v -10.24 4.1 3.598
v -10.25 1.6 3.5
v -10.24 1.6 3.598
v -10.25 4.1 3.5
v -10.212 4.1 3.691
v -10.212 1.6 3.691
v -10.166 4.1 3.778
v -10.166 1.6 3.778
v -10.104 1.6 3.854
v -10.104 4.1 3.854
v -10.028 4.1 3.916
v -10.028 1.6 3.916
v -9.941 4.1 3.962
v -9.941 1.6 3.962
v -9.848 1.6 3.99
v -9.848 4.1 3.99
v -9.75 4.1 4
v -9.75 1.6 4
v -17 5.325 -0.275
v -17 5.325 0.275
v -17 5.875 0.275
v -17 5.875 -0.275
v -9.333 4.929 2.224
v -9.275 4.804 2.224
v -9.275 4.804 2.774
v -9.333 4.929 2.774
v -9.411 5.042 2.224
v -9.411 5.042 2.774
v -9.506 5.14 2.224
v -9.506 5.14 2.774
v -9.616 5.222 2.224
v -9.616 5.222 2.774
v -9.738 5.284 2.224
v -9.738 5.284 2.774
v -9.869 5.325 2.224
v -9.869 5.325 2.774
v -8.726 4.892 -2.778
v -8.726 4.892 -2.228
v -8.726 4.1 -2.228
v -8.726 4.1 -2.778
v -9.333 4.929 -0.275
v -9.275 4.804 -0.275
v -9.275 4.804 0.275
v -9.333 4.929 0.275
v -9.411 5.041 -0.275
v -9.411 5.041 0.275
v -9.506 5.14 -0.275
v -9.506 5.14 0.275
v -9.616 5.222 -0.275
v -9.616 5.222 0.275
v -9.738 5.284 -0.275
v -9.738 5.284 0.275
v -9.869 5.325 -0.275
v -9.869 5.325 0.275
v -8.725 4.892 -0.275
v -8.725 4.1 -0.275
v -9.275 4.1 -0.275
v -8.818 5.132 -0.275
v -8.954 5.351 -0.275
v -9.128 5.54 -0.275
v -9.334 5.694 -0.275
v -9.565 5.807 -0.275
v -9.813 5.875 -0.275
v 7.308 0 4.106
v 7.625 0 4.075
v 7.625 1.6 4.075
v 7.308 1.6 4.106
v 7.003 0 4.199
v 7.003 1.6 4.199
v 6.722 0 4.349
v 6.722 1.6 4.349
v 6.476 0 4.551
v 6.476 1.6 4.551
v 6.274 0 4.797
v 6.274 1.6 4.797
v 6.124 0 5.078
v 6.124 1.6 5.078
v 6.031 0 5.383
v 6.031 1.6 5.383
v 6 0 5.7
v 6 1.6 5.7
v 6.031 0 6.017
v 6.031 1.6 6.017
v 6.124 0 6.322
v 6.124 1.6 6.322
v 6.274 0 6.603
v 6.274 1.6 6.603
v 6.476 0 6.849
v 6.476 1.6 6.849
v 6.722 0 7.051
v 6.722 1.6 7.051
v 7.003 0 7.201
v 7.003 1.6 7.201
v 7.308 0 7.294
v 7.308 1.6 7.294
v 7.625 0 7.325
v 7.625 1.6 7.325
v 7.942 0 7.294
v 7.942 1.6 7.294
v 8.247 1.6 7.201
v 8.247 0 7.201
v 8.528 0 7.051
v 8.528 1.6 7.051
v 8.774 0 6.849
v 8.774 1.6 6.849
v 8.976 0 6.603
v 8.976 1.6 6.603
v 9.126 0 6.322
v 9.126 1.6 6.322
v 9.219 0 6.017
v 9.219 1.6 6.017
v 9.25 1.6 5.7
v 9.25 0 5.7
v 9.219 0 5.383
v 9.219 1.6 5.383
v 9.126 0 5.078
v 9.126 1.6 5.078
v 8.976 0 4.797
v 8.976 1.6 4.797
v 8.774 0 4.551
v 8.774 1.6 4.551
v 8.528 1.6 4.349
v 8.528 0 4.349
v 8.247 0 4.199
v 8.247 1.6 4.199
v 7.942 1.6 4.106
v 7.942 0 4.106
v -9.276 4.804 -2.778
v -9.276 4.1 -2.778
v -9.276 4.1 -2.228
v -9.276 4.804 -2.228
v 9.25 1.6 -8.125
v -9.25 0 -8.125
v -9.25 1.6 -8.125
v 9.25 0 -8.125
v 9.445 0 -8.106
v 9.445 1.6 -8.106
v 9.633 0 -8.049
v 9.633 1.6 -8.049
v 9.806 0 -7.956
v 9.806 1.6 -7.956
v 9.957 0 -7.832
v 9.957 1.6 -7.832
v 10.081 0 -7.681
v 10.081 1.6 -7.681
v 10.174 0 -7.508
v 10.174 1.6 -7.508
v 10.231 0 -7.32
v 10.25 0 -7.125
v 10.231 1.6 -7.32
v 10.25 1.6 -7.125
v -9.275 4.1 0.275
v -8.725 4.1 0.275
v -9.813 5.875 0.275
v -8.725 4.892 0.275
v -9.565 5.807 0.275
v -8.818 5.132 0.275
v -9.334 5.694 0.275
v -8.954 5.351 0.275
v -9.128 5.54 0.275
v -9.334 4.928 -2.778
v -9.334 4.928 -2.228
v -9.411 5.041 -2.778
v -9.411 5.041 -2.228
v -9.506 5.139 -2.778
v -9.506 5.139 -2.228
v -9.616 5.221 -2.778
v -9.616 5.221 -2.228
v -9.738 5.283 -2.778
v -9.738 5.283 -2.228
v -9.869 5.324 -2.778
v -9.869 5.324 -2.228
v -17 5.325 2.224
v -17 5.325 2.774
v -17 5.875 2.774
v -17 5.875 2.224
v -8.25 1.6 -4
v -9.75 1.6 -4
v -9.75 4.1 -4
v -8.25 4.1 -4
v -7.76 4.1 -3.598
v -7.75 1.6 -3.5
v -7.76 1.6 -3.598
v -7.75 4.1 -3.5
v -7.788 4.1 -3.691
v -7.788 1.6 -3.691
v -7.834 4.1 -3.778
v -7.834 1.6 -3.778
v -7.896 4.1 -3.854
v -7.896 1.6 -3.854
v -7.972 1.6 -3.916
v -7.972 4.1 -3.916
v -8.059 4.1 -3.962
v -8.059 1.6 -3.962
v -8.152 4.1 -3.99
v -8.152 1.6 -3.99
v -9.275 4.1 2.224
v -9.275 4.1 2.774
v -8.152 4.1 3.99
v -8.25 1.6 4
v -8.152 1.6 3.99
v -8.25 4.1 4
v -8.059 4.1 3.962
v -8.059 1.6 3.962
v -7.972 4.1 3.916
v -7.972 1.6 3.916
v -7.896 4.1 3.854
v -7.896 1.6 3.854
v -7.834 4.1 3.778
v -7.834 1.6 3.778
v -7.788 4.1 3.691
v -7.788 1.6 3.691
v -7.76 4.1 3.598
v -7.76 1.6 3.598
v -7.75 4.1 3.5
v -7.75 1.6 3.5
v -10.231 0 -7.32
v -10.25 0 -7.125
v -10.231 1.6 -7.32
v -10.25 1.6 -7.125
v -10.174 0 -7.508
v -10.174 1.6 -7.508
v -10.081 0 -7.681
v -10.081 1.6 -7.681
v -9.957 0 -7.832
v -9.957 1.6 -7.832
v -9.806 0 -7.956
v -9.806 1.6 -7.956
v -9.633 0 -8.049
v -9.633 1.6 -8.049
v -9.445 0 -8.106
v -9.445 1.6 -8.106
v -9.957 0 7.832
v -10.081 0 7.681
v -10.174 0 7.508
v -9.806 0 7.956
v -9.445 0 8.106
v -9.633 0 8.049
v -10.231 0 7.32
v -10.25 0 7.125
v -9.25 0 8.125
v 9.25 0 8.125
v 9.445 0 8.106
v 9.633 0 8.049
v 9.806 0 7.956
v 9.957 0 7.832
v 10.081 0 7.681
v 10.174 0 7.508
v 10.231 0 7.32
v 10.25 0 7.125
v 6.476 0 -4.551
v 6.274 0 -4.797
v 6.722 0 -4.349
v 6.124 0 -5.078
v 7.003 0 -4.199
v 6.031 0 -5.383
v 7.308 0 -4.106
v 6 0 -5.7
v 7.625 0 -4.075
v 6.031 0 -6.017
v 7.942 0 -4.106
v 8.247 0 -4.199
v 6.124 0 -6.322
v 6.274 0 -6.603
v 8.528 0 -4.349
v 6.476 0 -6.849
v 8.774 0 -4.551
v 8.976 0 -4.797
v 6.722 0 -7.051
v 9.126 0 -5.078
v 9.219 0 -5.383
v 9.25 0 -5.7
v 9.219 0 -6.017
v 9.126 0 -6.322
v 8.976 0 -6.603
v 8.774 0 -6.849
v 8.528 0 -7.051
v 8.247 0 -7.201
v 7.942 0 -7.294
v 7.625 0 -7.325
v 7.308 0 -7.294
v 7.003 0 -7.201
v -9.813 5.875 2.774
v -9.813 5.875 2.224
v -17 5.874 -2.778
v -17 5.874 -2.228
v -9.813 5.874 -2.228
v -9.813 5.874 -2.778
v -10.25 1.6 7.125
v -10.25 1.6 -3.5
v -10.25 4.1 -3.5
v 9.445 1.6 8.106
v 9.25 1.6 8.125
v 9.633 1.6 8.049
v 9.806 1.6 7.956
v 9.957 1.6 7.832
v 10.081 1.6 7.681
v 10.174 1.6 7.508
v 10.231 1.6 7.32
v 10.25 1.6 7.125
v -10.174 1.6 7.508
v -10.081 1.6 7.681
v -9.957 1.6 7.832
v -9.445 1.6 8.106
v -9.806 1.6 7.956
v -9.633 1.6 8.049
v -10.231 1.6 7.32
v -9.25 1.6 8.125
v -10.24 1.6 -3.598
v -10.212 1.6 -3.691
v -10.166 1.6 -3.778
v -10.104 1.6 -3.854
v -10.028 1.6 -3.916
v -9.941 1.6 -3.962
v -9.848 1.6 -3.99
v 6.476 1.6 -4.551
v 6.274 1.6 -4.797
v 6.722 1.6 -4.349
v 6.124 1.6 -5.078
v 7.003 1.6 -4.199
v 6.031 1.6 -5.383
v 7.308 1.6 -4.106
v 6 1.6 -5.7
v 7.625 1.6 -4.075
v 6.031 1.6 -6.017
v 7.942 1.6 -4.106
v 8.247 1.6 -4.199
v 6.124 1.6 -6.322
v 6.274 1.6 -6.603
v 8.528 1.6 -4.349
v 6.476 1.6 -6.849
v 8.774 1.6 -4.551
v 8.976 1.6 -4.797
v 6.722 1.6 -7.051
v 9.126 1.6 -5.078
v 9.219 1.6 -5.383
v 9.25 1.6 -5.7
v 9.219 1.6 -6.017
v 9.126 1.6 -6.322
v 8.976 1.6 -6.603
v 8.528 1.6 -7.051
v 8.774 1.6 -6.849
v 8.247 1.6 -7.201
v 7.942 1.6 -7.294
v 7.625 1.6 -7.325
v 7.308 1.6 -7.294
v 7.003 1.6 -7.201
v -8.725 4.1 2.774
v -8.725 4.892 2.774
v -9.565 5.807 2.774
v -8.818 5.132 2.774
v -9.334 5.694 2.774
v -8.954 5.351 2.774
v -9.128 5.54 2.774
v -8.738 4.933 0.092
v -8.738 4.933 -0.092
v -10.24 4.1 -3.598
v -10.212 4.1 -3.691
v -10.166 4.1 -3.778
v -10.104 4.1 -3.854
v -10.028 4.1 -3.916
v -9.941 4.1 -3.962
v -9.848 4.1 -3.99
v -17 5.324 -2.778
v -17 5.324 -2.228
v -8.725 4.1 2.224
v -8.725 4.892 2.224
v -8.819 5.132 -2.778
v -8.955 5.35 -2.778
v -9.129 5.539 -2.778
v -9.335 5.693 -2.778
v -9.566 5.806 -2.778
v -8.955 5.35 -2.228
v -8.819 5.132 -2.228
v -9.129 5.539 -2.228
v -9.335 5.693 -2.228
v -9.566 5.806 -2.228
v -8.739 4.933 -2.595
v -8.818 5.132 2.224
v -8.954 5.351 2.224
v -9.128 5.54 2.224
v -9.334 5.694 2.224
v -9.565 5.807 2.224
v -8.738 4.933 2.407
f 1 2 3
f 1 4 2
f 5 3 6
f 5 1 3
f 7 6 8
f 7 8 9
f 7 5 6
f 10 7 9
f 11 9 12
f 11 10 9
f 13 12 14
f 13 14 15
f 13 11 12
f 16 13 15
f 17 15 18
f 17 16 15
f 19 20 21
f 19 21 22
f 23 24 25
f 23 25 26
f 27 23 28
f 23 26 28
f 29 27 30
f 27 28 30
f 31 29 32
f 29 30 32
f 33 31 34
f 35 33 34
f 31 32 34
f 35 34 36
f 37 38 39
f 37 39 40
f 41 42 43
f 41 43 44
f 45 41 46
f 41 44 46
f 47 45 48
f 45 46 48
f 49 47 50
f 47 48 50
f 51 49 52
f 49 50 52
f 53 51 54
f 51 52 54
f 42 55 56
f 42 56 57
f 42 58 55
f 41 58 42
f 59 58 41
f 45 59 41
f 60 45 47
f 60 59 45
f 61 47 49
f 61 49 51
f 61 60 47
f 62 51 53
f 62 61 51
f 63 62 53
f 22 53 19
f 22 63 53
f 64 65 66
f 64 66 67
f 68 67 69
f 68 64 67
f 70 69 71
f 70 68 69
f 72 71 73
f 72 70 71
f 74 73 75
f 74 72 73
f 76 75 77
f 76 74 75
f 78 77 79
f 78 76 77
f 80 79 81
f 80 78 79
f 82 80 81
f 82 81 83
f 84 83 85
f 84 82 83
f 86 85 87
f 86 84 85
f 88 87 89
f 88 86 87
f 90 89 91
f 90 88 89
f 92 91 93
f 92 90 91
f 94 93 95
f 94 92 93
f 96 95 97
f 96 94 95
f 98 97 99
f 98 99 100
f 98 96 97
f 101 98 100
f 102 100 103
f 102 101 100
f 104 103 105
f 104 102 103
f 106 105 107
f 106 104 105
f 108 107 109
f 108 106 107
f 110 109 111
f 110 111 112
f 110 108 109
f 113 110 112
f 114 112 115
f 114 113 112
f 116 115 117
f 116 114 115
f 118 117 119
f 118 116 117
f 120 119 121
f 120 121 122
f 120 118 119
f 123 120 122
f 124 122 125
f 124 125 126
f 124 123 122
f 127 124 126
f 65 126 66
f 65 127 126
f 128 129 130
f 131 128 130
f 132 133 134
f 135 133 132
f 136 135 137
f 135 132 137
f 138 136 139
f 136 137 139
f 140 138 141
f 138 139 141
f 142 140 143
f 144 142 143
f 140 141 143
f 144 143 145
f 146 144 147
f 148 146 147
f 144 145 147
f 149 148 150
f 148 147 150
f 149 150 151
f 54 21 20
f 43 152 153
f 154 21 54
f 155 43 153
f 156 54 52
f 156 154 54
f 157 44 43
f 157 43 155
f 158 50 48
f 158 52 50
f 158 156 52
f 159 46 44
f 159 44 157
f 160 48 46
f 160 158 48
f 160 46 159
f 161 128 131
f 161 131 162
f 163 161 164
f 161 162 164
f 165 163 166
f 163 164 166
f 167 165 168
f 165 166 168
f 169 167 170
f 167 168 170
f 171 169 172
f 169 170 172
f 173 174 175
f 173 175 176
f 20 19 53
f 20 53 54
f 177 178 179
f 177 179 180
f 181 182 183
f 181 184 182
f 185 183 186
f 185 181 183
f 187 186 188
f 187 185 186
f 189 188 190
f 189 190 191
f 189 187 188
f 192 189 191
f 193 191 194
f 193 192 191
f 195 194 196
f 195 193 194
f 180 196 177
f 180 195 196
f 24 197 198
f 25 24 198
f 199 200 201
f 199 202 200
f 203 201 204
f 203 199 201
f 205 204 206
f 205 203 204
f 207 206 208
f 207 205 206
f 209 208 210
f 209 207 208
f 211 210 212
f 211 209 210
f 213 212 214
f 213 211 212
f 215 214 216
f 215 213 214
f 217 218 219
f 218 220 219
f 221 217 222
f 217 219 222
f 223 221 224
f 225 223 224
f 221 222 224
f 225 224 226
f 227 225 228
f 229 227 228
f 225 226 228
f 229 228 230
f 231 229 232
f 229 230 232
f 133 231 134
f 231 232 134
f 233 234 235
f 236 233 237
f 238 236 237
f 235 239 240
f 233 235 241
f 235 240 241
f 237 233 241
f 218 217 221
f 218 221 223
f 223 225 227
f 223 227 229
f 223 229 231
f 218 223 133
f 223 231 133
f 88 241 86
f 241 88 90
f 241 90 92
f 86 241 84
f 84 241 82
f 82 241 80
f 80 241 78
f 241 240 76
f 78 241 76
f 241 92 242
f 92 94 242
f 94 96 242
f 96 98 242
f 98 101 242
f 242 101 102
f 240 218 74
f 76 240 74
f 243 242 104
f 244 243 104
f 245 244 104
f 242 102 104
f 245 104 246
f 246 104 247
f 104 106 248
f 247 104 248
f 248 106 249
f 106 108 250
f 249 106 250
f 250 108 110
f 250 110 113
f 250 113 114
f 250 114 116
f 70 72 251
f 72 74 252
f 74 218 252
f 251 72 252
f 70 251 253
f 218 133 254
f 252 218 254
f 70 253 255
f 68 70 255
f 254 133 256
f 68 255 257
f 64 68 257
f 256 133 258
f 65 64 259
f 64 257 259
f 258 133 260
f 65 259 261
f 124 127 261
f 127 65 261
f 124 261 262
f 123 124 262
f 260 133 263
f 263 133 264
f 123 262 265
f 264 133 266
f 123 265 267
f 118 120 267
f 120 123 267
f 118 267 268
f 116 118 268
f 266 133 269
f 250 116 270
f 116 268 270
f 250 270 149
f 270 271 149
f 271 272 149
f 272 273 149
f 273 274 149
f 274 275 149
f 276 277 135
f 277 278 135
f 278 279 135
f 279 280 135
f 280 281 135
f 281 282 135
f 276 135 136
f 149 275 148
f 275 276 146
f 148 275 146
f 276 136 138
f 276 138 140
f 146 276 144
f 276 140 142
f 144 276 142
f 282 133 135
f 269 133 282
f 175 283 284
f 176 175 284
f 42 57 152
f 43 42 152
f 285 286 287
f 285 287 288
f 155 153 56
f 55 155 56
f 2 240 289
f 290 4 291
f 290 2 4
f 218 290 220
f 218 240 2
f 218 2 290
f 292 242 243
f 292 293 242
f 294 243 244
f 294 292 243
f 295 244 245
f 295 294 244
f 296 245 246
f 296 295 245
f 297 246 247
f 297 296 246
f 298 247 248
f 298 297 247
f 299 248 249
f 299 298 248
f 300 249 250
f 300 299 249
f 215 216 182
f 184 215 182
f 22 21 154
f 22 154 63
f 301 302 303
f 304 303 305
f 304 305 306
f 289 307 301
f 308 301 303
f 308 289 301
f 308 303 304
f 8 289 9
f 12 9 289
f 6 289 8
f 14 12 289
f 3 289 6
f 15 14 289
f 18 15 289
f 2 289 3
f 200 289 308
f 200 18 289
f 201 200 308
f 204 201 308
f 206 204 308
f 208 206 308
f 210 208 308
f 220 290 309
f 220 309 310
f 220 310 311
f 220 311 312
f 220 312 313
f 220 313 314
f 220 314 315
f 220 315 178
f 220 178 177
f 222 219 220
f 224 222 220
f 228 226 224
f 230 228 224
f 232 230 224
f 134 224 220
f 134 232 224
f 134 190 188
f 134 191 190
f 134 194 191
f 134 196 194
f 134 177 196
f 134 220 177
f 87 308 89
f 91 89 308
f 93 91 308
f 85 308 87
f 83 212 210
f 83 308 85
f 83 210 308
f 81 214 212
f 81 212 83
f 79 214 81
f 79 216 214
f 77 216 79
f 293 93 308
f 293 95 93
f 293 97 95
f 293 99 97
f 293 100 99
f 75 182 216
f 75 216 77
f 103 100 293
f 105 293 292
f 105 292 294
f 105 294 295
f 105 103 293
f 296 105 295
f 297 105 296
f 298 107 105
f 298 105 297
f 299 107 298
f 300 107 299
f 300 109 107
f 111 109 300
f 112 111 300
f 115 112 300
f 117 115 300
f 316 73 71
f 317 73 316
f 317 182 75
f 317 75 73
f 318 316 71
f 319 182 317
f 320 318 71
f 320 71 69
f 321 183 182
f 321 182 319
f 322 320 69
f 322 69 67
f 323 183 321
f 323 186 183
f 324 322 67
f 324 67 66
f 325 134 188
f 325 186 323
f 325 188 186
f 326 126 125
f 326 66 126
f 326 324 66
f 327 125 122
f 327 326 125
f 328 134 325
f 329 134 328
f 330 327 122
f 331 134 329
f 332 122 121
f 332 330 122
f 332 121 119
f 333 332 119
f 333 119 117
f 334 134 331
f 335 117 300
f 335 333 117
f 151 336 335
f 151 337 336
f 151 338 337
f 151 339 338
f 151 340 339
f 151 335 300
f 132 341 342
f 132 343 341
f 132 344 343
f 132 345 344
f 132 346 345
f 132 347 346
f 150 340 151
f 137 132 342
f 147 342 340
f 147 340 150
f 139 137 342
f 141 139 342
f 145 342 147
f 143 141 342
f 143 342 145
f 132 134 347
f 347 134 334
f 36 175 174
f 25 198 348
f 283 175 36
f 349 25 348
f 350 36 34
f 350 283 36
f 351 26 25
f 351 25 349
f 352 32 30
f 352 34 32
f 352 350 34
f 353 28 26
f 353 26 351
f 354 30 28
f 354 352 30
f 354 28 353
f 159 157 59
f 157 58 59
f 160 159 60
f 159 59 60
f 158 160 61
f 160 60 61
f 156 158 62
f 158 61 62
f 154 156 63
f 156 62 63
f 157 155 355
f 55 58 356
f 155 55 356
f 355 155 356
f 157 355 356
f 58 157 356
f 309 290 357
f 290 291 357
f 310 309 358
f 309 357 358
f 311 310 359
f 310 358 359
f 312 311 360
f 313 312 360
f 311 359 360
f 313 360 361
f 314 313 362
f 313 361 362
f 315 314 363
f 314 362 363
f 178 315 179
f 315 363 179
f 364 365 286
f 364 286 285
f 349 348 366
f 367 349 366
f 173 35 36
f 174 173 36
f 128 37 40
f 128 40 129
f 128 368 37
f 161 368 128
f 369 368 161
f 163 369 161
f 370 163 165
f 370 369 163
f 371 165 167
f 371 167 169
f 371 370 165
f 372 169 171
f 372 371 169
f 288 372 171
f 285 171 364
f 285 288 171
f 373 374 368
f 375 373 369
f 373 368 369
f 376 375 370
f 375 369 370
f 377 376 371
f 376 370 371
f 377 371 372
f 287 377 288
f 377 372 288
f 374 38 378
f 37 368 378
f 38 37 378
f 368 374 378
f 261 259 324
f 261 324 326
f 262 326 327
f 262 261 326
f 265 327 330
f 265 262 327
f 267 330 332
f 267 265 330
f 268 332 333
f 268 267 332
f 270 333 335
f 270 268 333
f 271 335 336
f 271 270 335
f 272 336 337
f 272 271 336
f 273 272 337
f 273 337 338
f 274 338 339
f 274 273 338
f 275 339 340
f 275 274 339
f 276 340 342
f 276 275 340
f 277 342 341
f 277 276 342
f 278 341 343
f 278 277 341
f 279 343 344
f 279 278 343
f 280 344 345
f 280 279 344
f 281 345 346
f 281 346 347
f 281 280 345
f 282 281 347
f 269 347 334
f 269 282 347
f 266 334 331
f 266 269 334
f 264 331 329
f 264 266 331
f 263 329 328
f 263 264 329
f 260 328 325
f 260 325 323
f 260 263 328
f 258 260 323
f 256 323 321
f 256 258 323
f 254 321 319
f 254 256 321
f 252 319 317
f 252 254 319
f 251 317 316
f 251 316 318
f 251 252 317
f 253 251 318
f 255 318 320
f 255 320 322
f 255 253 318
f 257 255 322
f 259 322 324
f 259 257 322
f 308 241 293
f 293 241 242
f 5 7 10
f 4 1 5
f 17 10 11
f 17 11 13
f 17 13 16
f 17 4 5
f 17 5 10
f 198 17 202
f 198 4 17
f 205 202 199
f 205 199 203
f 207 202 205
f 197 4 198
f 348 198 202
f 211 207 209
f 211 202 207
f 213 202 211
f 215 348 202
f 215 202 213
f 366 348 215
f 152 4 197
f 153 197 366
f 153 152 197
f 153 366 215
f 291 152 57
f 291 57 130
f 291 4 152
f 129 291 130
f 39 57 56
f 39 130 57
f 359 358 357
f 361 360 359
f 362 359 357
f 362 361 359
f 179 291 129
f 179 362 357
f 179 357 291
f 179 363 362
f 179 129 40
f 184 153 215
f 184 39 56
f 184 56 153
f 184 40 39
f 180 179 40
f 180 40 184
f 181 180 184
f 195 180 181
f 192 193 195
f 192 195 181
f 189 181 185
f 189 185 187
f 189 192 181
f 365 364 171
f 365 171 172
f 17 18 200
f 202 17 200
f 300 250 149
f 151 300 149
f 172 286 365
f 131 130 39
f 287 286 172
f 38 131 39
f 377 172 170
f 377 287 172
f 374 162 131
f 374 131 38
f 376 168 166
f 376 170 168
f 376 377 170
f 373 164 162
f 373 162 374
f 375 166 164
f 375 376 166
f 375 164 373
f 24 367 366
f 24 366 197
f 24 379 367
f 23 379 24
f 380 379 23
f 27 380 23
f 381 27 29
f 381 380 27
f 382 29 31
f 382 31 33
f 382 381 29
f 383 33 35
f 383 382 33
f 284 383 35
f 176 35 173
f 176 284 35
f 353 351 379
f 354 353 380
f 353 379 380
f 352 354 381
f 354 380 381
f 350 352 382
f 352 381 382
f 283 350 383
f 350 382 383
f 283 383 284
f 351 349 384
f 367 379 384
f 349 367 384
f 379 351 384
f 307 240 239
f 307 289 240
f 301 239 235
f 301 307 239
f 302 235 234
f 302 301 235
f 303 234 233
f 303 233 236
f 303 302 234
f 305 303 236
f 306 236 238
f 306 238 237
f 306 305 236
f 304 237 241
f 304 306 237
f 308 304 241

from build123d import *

# Parameters (mm, degrees)
SKETCH1_W           = 20.5
SKETCH1_H           = 16.25
SKETCH1_R           = 1.625
BOSS_EXTRUDE1_DEPTH = 1.6
FILLET1_R           = 1
SKETCH2_W           = 2.5
SKETCH2_H           = 8
BOSS_EXTRUDE2_DEPTH = 2.5
FILLET2_R           = 0.5
SKETCH8_W           = 0.55
SKETCH8_H           = 0.55
SKETCH9_W           = 0.55
SKETCH9_H           = 0.55
SKETCH4_W           = 0.55
SKETCH4_H           = 0.55


with BuildPart() as part:
    # Sketch1 → Boss-Extrude1 (new body)
    with BuildSketch(Plane(origin=(0, 0, 0), x_dir=(1, 0, 0), z_dir=(0, 1, 0))):
        Rectangle(SKETCH1_W, SKETCH1_H)
        with Locations(Location((7.625, 5.7, 0), (0, 0, 270))):
            Circle(SKETCH1_R, mode=Mode.SUBTRACT)
        with Locations(Location((7.625, -5.7, 0), (0, 0, 90))):
            Circle(SKETCH1_R, mode=Mode.SUBTRACT)
    extrude(amount=BOSS_EXTRUDE1_DEPTH)

    # Fillet1
    fillet1_edges = [part.edges().sort_by_distance(p)[0] for p in [
        (10.25, 0.8, 8.125),
        (-10.25, 0.8, 8.125),
        (-10.25, 0.8, -8.125),
        (10.25, 0.8, -8.125),
    ]]
    fillet(fillet1_edges, radius=FILLET1_R)

    # Sketch2 → Boss-Extrude2 (add)
    with BuildSketch(Plane(origin=(0, 1.6, 0), x_dir=(1, 0, 0), z_dir=(0, 1, 0))):
        with Locations((-9, 0)):
            Rectangle(SKETCH2_W, SKETCH2_H)
    extrude(amount=BOSS_EXTRUDE2_DEPTH)

    # Fillet2
    fillet2_edges = [part.edges().sort_by_distance(p)[0] for p in [
        (-7.75, 2.85, 4),
        (-7.75, 2.85, -4),
        (-10.25, 2.85, -4),
        (-10.25, 2.85, 4),
    ]]
    fillet(fillet2_edges, radius=FILLET2_R)

    # Sweep2: sweep along a path in Sketch5
    with BuildLine(Plane.XY.offset(-2.5)) as sweep2_path:
        Line((-9, 4.1), (-9, 4.85))
        ThreePointArc((-9, 4.85), (-9.317041617, 5.34027213), (-9.839940826, 5.6))
        Line((-9.839940826, 5.6), (-17, 5.6))
    # Sketch8 → Sweep2 (sweep)
    with BuildSketch(Plane(origin=(0, 4.1, 0), x_dir=(1, 0, 0), z_dir=(0, 1, 0))):
        with Locations((-9.001105099, 2.502876889)):
            Rectangle(SKETCH8_W, SKETCH8_H)
    sweep(path=sweep2_path.line, transition=Transition.RIGHT)

    # Sweep3: sweep along a path in Sketch6
    with BuildLine(Plane.XY.offset(2.5)) as sweep3_path:
        Line((-9, 4.1), (-9, 4.85))
        ThreePointArc((-9, 4.85), (-9.317041617, 5.34027213), (-9.839940826, 5.6))
        Line((-9.839940826, 5.6), (-17, 5.6))
    # Sketch9 → Sweep3 (sweep)
    with BuildSketch(Plane(origin=(0, 4.1, 0), x_dir=(1, 0, 0), z_dir=(0, 1, 0))):
        with Locations((-8.999962547, -2.498553748)):
            Rectangle(SKETCH9_W, SKETCH9_H)
    sweep(path=sweep3_path.line, transition=Transition.RIGHT)

    # Sweep4: sweep along a path in Sketch3
    with BuildLine(Plane.XY) as sweep4_path:
        Line((-9, 4.1), (-9, 4.85))
        ThreePointArc((-9, 4.85), (-9.317041617, 5.34027213), (-9.839940826, 5.6))
        Line((-9.839940826, 5.6), (-17, 5.6))
    # Sketch4 → Sweep4 (sweep)
    with BuildSketch(Plane(origin=(0, 4.1, 0), x_dir=(1, 0, 0), z_dir=(0, 1, 0))):
        with Locations((-9, 0)):
            Rectangle(SKETCH4_W, SKETCH4_H)
    sweep(path=sweep4_path.line, transition=Transition.RIGHT)


solid = part.part
